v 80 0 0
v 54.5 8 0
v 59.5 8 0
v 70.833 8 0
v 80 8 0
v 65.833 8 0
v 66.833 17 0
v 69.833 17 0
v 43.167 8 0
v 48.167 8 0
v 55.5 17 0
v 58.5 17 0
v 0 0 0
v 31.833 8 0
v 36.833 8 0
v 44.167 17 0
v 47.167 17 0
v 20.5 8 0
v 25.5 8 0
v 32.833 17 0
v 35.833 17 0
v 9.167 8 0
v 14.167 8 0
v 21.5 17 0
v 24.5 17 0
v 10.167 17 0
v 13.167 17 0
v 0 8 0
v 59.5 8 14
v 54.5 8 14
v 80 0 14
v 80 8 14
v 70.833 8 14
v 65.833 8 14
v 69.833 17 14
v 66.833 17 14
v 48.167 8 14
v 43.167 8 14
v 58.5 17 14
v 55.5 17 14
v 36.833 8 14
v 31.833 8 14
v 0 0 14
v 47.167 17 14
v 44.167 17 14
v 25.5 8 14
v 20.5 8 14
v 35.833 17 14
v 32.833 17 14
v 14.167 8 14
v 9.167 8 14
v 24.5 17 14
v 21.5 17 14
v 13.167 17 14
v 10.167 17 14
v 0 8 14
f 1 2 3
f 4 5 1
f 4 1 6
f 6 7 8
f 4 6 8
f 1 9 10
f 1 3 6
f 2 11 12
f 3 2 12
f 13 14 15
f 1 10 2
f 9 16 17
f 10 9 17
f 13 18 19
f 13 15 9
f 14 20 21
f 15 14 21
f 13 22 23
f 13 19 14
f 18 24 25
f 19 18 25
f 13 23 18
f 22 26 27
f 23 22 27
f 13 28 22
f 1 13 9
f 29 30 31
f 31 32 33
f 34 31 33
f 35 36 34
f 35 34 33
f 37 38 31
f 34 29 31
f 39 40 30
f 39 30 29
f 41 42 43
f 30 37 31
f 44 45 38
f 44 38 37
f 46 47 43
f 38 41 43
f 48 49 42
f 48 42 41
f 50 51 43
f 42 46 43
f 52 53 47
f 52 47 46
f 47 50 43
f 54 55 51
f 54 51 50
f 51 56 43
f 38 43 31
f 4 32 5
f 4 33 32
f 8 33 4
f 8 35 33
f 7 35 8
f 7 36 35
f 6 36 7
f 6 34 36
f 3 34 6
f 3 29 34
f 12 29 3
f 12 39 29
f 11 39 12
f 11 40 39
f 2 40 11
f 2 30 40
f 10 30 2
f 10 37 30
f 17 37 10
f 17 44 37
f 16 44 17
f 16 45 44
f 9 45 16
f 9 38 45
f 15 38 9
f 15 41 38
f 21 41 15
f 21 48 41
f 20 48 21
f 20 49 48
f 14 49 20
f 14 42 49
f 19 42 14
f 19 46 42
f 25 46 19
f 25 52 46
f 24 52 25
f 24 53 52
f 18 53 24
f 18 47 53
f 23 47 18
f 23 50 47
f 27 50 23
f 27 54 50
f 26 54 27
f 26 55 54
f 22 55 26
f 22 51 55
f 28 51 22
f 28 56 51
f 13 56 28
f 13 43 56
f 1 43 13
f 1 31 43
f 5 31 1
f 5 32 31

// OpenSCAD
$fn = 32;

// ----------------------------------------------------------------------
// Gear rack: 6 teeth on a 80 mm bar, pitch 11.33 mm
// ----------------------------------------------------------------------

// --- parameters (mm) ---
profile_height = 14;      // extrusion height
profile_points = 28;      // points of the closed outline

profile = [[0, 0], [80, 0], [80, 8], [70.833, 8], [69.833, 17], [66.833, 17], [65.833, 8], [59.5, 8], [58.5, 17], [55.5, 17], [54.5, 8], [48.167, 8], [47.167, 17], [44.167, 17], [43.167, 8], [36.833, 8], [35.833, 17], [32.833, 17], [31.833, 8], [25.5, 8], [24.5, 17], [21.5, 17], [20.5, 8], [14.167, 8], [13.167, 17], [10.167, 17], [9.167, 8], [0, 8]];  // single closed polygon, 28 points, counter clockwise

// --- the one profile operation ---
linear_extrude(height = profile_height) polygon(points = profile);
